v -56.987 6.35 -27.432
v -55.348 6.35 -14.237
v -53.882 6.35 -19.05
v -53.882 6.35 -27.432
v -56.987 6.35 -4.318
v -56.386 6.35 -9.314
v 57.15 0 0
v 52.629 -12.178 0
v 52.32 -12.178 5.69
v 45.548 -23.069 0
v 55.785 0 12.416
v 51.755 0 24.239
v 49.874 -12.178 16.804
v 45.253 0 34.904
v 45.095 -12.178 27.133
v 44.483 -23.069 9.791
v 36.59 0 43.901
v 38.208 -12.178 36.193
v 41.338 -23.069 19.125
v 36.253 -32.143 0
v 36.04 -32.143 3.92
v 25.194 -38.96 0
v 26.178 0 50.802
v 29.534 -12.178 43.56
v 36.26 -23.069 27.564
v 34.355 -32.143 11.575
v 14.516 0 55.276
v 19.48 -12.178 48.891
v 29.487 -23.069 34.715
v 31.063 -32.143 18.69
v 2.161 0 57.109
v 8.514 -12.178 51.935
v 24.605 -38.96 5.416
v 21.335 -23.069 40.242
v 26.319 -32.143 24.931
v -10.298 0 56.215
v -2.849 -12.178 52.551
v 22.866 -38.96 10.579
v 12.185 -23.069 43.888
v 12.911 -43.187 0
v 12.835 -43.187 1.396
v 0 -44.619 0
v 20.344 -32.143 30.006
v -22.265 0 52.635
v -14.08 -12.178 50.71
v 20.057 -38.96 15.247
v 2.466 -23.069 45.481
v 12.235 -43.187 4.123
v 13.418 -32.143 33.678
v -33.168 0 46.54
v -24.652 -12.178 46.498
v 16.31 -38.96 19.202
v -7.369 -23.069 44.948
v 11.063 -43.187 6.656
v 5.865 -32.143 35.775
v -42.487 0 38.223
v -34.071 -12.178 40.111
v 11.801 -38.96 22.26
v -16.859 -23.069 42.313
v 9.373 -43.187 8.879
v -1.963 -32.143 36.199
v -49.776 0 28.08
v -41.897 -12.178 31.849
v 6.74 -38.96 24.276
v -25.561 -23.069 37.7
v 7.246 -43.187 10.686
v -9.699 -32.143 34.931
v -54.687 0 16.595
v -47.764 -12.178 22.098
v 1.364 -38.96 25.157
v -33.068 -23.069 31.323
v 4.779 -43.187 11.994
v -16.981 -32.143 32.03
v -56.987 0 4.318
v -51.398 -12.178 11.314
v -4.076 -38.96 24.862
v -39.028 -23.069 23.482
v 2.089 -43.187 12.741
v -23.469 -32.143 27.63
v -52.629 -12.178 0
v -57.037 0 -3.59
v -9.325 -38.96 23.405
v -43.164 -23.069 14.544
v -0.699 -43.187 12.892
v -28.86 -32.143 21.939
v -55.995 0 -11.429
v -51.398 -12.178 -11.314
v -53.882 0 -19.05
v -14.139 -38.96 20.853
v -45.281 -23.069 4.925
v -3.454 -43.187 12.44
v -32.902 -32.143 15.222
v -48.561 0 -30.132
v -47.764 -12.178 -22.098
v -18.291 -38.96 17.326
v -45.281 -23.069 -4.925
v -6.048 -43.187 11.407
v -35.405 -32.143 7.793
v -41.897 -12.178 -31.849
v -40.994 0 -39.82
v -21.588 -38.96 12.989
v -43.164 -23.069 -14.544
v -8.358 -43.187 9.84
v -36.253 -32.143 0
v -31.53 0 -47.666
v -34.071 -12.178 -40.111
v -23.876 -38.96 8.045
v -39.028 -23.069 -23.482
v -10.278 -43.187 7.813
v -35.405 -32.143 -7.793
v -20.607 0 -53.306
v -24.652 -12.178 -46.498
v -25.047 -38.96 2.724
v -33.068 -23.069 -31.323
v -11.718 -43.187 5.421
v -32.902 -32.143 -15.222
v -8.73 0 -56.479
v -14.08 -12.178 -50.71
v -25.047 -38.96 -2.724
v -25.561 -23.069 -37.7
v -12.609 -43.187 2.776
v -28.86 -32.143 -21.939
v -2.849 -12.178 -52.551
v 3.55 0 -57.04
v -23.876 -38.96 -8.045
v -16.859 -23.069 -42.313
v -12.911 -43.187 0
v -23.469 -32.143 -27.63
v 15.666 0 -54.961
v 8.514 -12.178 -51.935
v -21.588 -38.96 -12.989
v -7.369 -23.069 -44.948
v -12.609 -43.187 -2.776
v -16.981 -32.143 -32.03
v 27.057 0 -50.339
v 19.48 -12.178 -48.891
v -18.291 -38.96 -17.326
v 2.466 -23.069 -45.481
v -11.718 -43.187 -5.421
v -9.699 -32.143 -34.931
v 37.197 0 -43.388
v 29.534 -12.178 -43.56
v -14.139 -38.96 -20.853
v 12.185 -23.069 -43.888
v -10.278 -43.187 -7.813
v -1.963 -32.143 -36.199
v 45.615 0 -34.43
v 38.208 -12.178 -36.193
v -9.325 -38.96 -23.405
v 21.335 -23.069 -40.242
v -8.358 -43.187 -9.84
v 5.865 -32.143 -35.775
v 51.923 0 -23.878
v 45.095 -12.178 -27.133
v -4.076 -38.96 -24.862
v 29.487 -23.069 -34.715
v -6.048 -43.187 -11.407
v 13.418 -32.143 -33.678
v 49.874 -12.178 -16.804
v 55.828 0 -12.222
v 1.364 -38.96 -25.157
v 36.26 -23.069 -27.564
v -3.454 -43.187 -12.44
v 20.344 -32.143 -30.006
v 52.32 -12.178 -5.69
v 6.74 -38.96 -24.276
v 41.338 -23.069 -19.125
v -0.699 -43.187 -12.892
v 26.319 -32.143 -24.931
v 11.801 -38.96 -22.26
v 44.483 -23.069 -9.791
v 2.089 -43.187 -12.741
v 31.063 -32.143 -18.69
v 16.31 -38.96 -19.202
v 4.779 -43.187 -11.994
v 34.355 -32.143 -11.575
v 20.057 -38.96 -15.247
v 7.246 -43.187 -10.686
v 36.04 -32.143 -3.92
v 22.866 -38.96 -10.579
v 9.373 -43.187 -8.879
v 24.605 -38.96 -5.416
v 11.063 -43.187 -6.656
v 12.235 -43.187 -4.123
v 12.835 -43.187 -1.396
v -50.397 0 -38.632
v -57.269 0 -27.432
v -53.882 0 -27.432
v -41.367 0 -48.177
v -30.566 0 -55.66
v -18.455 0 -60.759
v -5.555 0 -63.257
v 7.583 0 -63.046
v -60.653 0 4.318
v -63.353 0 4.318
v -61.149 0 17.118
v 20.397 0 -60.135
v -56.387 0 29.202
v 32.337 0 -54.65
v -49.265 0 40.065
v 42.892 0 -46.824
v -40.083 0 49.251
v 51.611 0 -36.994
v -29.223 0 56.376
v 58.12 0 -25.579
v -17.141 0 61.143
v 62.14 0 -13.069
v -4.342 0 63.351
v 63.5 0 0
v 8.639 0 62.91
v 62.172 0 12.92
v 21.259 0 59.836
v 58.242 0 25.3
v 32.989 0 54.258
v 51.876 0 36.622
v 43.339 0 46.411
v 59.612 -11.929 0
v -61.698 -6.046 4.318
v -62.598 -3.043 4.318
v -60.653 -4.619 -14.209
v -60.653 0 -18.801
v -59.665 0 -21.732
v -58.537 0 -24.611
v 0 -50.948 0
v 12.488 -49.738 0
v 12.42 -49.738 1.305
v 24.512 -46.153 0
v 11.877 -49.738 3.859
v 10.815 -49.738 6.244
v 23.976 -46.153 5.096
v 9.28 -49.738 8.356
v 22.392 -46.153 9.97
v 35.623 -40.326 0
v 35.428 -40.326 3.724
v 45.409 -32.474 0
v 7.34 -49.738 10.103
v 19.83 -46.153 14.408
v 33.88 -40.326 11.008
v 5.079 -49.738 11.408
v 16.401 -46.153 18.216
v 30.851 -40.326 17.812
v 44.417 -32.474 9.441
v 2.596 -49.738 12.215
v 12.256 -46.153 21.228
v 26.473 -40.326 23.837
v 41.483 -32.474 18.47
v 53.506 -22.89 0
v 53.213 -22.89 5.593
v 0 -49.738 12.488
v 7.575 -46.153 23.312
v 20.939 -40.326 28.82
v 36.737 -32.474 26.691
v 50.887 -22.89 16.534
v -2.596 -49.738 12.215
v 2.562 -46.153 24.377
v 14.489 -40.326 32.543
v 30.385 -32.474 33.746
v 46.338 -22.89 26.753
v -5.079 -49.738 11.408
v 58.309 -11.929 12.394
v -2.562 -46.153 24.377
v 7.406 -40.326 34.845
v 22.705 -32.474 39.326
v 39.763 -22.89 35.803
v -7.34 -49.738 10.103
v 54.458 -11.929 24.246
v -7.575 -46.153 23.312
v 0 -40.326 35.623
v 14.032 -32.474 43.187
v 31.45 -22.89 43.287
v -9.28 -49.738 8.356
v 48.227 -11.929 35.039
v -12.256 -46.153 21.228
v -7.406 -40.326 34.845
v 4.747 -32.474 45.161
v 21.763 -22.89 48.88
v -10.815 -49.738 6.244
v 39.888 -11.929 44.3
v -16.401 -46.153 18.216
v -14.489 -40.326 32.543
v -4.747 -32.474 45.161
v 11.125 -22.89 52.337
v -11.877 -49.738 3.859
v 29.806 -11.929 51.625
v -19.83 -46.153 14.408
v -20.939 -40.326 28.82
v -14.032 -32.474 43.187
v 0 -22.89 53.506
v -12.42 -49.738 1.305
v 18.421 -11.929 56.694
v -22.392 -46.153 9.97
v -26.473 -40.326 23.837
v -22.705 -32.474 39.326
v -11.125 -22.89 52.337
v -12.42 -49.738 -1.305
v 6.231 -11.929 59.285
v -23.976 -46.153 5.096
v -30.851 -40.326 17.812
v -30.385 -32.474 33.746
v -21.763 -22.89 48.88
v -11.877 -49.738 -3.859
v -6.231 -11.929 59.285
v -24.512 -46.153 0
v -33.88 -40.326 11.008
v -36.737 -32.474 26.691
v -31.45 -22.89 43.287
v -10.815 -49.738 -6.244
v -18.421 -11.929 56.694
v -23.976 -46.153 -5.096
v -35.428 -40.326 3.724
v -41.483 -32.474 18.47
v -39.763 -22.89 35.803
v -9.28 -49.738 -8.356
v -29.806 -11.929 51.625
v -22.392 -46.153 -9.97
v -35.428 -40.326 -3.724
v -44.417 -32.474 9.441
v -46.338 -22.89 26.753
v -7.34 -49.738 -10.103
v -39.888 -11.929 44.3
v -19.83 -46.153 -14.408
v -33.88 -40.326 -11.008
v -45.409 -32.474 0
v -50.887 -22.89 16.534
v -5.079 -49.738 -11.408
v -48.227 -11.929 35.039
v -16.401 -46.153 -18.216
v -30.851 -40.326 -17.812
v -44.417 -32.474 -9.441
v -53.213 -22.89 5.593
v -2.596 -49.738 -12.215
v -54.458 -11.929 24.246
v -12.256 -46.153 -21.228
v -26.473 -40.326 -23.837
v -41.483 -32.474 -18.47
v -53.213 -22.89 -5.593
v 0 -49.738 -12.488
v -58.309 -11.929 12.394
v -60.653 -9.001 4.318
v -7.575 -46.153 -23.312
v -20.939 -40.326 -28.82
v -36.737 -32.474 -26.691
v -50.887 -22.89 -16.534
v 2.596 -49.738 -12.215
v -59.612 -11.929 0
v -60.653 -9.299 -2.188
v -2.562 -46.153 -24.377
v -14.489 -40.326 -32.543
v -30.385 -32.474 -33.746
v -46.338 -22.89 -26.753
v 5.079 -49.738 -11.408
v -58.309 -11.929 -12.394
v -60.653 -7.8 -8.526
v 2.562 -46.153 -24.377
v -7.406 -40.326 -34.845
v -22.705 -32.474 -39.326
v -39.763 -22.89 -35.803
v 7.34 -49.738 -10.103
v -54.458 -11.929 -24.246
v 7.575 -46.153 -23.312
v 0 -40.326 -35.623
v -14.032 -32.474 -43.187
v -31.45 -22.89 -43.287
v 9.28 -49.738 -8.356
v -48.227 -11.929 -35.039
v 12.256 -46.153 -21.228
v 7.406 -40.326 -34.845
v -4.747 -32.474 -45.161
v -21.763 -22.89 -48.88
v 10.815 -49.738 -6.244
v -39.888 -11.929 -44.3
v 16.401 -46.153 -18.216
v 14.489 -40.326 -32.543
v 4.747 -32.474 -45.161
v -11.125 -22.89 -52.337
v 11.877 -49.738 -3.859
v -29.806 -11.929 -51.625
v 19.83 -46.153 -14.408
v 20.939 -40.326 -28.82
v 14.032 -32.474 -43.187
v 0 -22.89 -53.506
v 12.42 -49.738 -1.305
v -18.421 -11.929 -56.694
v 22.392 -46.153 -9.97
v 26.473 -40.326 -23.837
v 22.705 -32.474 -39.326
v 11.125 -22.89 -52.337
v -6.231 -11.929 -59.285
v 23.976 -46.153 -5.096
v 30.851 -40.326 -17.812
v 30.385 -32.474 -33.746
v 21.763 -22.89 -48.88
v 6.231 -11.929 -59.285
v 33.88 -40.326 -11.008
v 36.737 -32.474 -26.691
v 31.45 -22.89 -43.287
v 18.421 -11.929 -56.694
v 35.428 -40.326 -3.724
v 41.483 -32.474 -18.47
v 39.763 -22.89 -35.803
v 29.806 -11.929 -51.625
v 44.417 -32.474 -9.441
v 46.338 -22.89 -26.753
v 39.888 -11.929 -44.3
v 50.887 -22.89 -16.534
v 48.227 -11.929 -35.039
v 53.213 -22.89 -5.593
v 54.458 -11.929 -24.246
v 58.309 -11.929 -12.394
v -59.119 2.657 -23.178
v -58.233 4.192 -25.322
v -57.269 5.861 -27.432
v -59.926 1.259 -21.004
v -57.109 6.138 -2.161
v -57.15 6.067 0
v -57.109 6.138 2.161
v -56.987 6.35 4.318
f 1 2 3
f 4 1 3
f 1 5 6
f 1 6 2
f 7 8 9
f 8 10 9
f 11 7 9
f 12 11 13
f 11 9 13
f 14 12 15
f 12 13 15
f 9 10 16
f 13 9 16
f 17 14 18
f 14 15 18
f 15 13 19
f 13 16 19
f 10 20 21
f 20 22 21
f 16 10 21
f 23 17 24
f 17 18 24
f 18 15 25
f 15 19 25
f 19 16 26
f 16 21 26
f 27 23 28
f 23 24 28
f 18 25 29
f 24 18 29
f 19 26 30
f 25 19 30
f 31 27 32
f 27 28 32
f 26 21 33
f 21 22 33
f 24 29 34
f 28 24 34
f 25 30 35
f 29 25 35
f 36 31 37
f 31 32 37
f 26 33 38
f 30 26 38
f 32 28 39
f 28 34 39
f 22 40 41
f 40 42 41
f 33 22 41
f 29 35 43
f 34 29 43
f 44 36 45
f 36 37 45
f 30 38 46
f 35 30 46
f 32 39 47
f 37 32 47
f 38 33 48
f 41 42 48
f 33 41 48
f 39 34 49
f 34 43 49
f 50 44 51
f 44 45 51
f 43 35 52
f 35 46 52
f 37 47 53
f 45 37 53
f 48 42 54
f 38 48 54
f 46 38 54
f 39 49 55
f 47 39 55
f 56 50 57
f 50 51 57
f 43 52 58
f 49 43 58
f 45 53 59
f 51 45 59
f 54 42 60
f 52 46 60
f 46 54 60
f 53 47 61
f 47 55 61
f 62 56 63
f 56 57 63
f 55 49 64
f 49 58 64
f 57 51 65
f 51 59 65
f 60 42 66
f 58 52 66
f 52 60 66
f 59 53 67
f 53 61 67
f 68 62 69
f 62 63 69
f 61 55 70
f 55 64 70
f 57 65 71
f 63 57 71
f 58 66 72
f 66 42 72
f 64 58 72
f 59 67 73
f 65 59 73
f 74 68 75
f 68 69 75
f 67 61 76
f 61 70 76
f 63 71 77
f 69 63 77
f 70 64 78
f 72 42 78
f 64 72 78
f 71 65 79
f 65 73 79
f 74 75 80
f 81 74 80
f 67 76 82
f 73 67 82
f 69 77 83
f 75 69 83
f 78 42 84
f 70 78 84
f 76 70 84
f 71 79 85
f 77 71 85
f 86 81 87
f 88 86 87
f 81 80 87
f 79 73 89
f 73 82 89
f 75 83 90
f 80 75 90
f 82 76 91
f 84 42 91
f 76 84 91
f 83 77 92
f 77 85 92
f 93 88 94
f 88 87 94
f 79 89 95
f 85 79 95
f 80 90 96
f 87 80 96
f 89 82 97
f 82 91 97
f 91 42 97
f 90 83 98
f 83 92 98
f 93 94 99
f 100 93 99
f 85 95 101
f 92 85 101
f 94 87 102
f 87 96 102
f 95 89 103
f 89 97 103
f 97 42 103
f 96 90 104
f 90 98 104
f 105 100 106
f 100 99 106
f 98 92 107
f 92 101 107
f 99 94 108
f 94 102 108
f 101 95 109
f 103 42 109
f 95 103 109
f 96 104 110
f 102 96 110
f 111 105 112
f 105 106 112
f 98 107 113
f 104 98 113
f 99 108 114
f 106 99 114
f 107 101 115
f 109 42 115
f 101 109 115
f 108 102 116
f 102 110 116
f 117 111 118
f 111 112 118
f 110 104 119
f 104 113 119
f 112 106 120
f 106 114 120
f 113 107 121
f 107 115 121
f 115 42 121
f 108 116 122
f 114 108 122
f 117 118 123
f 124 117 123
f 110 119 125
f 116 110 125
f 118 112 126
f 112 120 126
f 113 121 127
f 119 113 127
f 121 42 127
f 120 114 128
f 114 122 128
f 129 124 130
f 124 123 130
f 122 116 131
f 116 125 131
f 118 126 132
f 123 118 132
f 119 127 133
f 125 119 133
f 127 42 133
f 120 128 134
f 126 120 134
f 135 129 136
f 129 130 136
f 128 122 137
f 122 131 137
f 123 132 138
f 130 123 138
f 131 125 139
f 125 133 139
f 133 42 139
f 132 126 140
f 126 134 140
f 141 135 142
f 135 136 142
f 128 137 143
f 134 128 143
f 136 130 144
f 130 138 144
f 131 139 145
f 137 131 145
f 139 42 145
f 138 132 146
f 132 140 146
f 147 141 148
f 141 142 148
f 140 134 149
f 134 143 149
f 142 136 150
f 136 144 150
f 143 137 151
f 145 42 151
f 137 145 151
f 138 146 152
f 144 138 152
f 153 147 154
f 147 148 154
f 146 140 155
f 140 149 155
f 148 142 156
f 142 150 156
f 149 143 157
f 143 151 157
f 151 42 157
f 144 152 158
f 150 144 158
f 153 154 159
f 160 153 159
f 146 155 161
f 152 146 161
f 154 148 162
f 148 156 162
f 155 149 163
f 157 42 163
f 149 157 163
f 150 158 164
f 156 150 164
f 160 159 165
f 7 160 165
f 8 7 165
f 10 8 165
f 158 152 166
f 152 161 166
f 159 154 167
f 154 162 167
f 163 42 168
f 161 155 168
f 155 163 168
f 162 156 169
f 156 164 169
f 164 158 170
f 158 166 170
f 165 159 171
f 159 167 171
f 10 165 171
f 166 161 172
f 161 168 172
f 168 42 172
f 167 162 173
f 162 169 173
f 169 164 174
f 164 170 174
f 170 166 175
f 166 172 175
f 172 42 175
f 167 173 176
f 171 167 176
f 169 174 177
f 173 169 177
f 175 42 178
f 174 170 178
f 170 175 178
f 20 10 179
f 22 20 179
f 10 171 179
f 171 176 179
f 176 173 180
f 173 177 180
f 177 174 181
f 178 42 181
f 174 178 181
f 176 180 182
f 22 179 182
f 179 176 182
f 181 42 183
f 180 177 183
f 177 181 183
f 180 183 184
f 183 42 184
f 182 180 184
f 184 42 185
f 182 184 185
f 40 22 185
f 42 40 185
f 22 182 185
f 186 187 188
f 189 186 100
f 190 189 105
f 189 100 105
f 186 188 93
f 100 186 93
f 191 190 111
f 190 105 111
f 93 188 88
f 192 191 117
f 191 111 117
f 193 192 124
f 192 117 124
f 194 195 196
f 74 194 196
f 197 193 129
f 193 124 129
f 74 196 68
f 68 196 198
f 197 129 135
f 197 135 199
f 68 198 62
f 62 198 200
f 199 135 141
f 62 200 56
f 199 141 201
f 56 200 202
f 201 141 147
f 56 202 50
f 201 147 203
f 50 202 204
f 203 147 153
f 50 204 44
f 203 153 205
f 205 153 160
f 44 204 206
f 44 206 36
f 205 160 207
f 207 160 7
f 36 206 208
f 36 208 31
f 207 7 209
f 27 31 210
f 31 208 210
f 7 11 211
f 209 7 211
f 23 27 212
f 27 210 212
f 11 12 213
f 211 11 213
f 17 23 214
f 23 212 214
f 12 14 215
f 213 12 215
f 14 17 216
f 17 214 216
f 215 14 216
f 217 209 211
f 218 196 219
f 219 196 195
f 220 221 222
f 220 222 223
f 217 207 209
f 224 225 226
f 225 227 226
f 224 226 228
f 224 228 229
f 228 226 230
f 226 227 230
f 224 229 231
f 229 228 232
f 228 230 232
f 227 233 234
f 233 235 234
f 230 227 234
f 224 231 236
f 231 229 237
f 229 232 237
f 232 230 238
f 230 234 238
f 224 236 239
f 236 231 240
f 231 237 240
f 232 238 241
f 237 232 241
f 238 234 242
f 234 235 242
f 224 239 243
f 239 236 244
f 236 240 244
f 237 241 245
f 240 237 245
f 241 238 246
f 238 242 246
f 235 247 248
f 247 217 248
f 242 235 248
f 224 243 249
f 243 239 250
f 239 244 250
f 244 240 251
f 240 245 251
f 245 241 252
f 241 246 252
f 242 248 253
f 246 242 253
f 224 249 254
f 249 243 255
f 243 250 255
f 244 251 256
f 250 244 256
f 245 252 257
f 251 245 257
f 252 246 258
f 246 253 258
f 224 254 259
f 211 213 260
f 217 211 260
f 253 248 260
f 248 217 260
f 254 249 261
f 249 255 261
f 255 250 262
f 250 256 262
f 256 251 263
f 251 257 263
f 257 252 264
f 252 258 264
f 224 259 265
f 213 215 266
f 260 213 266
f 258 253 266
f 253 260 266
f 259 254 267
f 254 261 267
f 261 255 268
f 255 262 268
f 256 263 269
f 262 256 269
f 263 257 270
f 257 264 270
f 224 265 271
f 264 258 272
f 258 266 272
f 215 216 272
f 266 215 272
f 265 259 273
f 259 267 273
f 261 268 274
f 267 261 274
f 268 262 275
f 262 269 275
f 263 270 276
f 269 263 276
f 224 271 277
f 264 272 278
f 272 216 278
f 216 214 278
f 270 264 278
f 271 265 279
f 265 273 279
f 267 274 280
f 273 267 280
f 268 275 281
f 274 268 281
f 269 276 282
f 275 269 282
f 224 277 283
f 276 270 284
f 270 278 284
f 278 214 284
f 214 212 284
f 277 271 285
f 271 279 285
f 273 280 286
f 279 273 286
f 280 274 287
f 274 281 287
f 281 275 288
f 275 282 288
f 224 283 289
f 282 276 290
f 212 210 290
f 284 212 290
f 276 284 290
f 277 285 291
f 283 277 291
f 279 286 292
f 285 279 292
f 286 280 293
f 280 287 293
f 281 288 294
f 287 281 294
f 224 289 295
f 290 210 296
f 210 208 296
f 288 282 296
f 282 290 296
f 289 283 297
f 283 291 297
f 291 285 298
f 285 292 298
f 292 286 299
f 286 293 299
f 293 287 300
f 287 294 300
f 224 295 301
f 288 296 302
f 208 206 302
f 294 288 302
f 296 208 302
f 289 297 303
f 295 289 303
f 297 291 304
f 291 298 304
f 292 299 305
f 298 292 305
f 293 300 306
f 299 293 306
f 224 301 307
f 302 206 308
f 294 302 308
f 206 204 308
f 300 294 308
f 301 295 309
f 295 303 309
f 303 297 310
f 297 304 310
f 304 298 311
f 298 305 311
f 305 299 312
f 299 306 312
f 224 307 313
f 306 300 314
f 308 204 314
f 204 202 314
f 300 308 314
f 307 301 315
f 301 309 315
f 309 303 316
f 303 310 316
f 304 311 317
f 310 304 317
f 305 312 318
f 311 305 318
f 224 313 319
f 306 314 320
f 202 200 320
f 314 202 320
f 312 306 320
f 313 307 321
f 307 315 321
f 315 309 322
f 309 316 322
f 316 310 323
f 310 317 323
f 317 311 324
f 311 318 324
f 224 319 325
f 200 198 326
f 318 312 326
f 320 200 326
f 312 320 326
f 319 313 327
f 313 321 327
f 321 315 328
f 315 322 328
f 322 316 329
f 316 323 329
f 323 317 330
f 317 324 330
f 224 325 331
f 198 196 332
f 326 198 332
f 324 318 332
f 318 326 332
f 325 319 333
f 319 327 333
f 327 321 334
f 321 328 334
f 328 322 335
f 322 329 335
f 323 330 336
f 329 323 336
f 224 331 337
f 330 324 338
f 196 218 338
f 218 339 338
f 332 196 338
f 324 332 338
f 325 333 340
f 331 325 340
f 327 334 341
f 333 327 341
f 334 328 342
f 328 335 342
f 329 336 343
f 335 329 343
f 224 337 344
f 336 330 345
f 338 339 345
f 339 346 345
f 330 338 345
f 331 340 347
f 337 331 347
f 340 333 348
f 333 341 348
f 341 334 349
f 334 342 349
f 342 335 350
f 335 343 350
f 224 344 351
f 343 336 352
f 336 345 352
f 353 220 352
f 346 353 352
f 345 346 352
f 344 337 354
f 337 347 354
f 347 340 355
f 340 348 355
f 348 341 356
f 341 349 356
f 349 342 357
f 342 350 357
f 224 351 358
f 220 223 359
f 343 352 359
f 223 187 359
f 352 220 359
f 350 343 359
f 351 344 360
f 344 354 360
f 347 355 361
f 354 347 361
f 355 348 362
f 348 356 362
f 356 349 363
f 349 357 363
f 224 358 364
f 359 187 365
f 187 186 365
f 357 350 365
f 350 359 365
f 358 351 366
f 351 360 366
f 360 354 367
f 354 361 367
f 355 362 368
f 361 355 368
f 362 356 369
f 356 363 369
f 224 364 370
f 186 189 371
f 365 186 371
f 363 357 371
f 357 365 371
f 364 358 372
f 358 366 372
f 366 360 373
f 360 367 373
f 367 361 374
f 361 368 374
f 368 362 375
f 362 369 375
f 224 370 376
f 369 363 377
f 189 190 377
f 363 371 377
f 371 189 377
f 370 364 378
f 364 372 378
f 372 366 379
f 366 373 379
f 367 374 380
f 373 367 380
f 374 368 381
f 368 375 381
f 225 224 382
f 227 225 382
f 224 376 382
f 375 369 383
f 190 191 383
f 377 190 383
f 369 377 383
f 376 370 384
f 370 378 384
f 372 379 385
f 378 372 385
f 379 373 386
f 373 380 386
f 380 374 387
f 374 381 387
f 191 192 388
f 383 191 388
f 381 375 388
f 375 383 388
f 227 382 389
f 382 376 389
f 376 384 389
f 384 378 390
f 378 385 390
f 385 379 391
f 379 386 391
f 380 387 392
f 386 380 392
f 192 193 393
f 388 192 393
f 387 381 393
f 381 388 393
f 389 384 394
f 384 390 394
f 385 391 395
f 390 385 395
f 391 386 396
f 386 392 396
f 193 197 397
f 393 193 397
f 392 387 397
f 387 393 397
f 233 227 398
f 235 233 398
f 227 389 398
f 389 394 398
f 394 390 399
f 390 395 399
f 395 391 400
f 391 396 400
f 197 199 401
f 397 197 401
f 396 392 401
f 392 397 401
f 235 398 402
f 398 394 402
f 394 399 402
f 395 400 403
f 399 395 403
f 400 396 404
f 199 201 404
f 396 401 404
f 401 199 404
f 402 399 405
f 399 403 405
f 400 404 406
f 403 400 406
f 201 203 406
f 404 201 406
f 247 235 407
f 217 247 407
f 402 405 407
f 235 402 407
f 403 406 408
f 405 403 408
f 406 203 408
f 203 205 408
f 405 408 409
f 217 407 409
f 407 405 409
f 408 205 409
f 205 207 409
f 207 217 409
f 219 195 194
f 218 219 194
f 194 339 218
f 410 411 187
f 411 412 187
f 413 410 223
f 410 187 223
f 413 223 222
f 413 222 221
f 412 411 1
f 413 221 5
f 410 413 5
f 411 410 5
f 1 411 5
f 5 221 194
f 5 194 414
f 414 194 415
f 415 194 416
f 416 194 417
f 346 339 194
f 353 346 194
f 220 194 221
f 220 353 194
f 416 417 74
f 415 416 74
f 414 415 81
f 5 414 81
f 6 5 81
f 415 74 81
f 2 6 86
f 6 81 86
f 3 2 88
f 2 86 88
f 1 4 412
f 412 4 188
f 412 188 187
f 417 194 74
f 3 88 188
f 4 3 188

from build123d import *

# Parameters (mm, degrees)
BOSS_EXTRUDE1_DEPTH = 6.35
CUT_EXTRUDE1_DEPTH  = 33.02
CUT_EXTRUDE2_START  = -10.16
CUT_EXTRUDE2_DEPTH  = 10.16


with BuildPart() as part:
    # Sketch2 → Revolve1 (revolve)
    with BuildSketch(Plane.XY):
        with BuildLine():
            Line((63.5, 0), (57.15, 0))
            ThreePointArc((57.15, 0), (36.252554785, -32.143295216), (0, -44.61914851))
            Line((0, -44.61914851), (0, -50.8))
            Line((0, -50.8), (0, -50.947674419))
            ThreePointArc((0, -50.947674419), (40.70600548, -36.636394765), (63.5, 0))
        make_face()
    revolve(axis=Axis((0, 0, 0), (0, -1, 0)))

    # Sketch5 → Boss-Extrude1 (add)
    with BuildSketch(Plane(origin=(0, 0, 0), x_dir=(1, 0, 0), z_dir=(0, 1, 0))):
        with BuildLine():
            ThreePointArc((-56.986642084, -4.318), (-56.652044307, 7.52784005), (-53.881536726, 19.05))
            Line((-53.881536726, 19.05), (-53.881536726, 27.432))
            Line((-53.881536726, 27.432), (-57.268973939, 27.432))
            ThreePointArc((-57.268973939, 27.432), (-61.408309513, 16.163833787), (-63.353017892, 4.318))
            Line((-63.353017892, 4.318), (-63.353017892, -4.318))
            Line((-63.353017892, -4.318), (-56.986642084, -4.318))
        make_face()
    extrude(amount=BOSS_EXTRUDE1_DEPTH)

    # Sketch6 → Cut-Extrude1 (cut)
    with BuildSketch(Plane.XY.offset(4.318)):
        Polygon((-60.652816293, 0), (-56.986642084, 6.35), (-63.353017892, 6.35), (-63.353017892, 0), align=None)
    extrude(amount=-CUT_EXTRUDE1_DEPTH, mode=Mode.SUBTRACT)

    # Sketch7 → Cut-Extrude2 (cut)
    with BuildSketch(Plane(origin=(0, 0, 0), x_dir=(1, 0, 0), z_dir=(0, 1, 0)).offset(CUT_EXTRUDE2_START)):
        with BuildLine():
            Line((-63.353017892, -4.318), (-60.652816293, -4.318))
            Line((-60.652816293, -4.318), (-60.652816293, 18.801220059))
            ThreePointArc((-60.652816293, 18.801220059), (-63.071279613, 7.366389074), (-63.353017892, -4.318))
        make_face()
    extrude(amount=CUT_EXTRUDE2_DEPTH, mode=Mode.SUBTRACT)


solid = part.part
